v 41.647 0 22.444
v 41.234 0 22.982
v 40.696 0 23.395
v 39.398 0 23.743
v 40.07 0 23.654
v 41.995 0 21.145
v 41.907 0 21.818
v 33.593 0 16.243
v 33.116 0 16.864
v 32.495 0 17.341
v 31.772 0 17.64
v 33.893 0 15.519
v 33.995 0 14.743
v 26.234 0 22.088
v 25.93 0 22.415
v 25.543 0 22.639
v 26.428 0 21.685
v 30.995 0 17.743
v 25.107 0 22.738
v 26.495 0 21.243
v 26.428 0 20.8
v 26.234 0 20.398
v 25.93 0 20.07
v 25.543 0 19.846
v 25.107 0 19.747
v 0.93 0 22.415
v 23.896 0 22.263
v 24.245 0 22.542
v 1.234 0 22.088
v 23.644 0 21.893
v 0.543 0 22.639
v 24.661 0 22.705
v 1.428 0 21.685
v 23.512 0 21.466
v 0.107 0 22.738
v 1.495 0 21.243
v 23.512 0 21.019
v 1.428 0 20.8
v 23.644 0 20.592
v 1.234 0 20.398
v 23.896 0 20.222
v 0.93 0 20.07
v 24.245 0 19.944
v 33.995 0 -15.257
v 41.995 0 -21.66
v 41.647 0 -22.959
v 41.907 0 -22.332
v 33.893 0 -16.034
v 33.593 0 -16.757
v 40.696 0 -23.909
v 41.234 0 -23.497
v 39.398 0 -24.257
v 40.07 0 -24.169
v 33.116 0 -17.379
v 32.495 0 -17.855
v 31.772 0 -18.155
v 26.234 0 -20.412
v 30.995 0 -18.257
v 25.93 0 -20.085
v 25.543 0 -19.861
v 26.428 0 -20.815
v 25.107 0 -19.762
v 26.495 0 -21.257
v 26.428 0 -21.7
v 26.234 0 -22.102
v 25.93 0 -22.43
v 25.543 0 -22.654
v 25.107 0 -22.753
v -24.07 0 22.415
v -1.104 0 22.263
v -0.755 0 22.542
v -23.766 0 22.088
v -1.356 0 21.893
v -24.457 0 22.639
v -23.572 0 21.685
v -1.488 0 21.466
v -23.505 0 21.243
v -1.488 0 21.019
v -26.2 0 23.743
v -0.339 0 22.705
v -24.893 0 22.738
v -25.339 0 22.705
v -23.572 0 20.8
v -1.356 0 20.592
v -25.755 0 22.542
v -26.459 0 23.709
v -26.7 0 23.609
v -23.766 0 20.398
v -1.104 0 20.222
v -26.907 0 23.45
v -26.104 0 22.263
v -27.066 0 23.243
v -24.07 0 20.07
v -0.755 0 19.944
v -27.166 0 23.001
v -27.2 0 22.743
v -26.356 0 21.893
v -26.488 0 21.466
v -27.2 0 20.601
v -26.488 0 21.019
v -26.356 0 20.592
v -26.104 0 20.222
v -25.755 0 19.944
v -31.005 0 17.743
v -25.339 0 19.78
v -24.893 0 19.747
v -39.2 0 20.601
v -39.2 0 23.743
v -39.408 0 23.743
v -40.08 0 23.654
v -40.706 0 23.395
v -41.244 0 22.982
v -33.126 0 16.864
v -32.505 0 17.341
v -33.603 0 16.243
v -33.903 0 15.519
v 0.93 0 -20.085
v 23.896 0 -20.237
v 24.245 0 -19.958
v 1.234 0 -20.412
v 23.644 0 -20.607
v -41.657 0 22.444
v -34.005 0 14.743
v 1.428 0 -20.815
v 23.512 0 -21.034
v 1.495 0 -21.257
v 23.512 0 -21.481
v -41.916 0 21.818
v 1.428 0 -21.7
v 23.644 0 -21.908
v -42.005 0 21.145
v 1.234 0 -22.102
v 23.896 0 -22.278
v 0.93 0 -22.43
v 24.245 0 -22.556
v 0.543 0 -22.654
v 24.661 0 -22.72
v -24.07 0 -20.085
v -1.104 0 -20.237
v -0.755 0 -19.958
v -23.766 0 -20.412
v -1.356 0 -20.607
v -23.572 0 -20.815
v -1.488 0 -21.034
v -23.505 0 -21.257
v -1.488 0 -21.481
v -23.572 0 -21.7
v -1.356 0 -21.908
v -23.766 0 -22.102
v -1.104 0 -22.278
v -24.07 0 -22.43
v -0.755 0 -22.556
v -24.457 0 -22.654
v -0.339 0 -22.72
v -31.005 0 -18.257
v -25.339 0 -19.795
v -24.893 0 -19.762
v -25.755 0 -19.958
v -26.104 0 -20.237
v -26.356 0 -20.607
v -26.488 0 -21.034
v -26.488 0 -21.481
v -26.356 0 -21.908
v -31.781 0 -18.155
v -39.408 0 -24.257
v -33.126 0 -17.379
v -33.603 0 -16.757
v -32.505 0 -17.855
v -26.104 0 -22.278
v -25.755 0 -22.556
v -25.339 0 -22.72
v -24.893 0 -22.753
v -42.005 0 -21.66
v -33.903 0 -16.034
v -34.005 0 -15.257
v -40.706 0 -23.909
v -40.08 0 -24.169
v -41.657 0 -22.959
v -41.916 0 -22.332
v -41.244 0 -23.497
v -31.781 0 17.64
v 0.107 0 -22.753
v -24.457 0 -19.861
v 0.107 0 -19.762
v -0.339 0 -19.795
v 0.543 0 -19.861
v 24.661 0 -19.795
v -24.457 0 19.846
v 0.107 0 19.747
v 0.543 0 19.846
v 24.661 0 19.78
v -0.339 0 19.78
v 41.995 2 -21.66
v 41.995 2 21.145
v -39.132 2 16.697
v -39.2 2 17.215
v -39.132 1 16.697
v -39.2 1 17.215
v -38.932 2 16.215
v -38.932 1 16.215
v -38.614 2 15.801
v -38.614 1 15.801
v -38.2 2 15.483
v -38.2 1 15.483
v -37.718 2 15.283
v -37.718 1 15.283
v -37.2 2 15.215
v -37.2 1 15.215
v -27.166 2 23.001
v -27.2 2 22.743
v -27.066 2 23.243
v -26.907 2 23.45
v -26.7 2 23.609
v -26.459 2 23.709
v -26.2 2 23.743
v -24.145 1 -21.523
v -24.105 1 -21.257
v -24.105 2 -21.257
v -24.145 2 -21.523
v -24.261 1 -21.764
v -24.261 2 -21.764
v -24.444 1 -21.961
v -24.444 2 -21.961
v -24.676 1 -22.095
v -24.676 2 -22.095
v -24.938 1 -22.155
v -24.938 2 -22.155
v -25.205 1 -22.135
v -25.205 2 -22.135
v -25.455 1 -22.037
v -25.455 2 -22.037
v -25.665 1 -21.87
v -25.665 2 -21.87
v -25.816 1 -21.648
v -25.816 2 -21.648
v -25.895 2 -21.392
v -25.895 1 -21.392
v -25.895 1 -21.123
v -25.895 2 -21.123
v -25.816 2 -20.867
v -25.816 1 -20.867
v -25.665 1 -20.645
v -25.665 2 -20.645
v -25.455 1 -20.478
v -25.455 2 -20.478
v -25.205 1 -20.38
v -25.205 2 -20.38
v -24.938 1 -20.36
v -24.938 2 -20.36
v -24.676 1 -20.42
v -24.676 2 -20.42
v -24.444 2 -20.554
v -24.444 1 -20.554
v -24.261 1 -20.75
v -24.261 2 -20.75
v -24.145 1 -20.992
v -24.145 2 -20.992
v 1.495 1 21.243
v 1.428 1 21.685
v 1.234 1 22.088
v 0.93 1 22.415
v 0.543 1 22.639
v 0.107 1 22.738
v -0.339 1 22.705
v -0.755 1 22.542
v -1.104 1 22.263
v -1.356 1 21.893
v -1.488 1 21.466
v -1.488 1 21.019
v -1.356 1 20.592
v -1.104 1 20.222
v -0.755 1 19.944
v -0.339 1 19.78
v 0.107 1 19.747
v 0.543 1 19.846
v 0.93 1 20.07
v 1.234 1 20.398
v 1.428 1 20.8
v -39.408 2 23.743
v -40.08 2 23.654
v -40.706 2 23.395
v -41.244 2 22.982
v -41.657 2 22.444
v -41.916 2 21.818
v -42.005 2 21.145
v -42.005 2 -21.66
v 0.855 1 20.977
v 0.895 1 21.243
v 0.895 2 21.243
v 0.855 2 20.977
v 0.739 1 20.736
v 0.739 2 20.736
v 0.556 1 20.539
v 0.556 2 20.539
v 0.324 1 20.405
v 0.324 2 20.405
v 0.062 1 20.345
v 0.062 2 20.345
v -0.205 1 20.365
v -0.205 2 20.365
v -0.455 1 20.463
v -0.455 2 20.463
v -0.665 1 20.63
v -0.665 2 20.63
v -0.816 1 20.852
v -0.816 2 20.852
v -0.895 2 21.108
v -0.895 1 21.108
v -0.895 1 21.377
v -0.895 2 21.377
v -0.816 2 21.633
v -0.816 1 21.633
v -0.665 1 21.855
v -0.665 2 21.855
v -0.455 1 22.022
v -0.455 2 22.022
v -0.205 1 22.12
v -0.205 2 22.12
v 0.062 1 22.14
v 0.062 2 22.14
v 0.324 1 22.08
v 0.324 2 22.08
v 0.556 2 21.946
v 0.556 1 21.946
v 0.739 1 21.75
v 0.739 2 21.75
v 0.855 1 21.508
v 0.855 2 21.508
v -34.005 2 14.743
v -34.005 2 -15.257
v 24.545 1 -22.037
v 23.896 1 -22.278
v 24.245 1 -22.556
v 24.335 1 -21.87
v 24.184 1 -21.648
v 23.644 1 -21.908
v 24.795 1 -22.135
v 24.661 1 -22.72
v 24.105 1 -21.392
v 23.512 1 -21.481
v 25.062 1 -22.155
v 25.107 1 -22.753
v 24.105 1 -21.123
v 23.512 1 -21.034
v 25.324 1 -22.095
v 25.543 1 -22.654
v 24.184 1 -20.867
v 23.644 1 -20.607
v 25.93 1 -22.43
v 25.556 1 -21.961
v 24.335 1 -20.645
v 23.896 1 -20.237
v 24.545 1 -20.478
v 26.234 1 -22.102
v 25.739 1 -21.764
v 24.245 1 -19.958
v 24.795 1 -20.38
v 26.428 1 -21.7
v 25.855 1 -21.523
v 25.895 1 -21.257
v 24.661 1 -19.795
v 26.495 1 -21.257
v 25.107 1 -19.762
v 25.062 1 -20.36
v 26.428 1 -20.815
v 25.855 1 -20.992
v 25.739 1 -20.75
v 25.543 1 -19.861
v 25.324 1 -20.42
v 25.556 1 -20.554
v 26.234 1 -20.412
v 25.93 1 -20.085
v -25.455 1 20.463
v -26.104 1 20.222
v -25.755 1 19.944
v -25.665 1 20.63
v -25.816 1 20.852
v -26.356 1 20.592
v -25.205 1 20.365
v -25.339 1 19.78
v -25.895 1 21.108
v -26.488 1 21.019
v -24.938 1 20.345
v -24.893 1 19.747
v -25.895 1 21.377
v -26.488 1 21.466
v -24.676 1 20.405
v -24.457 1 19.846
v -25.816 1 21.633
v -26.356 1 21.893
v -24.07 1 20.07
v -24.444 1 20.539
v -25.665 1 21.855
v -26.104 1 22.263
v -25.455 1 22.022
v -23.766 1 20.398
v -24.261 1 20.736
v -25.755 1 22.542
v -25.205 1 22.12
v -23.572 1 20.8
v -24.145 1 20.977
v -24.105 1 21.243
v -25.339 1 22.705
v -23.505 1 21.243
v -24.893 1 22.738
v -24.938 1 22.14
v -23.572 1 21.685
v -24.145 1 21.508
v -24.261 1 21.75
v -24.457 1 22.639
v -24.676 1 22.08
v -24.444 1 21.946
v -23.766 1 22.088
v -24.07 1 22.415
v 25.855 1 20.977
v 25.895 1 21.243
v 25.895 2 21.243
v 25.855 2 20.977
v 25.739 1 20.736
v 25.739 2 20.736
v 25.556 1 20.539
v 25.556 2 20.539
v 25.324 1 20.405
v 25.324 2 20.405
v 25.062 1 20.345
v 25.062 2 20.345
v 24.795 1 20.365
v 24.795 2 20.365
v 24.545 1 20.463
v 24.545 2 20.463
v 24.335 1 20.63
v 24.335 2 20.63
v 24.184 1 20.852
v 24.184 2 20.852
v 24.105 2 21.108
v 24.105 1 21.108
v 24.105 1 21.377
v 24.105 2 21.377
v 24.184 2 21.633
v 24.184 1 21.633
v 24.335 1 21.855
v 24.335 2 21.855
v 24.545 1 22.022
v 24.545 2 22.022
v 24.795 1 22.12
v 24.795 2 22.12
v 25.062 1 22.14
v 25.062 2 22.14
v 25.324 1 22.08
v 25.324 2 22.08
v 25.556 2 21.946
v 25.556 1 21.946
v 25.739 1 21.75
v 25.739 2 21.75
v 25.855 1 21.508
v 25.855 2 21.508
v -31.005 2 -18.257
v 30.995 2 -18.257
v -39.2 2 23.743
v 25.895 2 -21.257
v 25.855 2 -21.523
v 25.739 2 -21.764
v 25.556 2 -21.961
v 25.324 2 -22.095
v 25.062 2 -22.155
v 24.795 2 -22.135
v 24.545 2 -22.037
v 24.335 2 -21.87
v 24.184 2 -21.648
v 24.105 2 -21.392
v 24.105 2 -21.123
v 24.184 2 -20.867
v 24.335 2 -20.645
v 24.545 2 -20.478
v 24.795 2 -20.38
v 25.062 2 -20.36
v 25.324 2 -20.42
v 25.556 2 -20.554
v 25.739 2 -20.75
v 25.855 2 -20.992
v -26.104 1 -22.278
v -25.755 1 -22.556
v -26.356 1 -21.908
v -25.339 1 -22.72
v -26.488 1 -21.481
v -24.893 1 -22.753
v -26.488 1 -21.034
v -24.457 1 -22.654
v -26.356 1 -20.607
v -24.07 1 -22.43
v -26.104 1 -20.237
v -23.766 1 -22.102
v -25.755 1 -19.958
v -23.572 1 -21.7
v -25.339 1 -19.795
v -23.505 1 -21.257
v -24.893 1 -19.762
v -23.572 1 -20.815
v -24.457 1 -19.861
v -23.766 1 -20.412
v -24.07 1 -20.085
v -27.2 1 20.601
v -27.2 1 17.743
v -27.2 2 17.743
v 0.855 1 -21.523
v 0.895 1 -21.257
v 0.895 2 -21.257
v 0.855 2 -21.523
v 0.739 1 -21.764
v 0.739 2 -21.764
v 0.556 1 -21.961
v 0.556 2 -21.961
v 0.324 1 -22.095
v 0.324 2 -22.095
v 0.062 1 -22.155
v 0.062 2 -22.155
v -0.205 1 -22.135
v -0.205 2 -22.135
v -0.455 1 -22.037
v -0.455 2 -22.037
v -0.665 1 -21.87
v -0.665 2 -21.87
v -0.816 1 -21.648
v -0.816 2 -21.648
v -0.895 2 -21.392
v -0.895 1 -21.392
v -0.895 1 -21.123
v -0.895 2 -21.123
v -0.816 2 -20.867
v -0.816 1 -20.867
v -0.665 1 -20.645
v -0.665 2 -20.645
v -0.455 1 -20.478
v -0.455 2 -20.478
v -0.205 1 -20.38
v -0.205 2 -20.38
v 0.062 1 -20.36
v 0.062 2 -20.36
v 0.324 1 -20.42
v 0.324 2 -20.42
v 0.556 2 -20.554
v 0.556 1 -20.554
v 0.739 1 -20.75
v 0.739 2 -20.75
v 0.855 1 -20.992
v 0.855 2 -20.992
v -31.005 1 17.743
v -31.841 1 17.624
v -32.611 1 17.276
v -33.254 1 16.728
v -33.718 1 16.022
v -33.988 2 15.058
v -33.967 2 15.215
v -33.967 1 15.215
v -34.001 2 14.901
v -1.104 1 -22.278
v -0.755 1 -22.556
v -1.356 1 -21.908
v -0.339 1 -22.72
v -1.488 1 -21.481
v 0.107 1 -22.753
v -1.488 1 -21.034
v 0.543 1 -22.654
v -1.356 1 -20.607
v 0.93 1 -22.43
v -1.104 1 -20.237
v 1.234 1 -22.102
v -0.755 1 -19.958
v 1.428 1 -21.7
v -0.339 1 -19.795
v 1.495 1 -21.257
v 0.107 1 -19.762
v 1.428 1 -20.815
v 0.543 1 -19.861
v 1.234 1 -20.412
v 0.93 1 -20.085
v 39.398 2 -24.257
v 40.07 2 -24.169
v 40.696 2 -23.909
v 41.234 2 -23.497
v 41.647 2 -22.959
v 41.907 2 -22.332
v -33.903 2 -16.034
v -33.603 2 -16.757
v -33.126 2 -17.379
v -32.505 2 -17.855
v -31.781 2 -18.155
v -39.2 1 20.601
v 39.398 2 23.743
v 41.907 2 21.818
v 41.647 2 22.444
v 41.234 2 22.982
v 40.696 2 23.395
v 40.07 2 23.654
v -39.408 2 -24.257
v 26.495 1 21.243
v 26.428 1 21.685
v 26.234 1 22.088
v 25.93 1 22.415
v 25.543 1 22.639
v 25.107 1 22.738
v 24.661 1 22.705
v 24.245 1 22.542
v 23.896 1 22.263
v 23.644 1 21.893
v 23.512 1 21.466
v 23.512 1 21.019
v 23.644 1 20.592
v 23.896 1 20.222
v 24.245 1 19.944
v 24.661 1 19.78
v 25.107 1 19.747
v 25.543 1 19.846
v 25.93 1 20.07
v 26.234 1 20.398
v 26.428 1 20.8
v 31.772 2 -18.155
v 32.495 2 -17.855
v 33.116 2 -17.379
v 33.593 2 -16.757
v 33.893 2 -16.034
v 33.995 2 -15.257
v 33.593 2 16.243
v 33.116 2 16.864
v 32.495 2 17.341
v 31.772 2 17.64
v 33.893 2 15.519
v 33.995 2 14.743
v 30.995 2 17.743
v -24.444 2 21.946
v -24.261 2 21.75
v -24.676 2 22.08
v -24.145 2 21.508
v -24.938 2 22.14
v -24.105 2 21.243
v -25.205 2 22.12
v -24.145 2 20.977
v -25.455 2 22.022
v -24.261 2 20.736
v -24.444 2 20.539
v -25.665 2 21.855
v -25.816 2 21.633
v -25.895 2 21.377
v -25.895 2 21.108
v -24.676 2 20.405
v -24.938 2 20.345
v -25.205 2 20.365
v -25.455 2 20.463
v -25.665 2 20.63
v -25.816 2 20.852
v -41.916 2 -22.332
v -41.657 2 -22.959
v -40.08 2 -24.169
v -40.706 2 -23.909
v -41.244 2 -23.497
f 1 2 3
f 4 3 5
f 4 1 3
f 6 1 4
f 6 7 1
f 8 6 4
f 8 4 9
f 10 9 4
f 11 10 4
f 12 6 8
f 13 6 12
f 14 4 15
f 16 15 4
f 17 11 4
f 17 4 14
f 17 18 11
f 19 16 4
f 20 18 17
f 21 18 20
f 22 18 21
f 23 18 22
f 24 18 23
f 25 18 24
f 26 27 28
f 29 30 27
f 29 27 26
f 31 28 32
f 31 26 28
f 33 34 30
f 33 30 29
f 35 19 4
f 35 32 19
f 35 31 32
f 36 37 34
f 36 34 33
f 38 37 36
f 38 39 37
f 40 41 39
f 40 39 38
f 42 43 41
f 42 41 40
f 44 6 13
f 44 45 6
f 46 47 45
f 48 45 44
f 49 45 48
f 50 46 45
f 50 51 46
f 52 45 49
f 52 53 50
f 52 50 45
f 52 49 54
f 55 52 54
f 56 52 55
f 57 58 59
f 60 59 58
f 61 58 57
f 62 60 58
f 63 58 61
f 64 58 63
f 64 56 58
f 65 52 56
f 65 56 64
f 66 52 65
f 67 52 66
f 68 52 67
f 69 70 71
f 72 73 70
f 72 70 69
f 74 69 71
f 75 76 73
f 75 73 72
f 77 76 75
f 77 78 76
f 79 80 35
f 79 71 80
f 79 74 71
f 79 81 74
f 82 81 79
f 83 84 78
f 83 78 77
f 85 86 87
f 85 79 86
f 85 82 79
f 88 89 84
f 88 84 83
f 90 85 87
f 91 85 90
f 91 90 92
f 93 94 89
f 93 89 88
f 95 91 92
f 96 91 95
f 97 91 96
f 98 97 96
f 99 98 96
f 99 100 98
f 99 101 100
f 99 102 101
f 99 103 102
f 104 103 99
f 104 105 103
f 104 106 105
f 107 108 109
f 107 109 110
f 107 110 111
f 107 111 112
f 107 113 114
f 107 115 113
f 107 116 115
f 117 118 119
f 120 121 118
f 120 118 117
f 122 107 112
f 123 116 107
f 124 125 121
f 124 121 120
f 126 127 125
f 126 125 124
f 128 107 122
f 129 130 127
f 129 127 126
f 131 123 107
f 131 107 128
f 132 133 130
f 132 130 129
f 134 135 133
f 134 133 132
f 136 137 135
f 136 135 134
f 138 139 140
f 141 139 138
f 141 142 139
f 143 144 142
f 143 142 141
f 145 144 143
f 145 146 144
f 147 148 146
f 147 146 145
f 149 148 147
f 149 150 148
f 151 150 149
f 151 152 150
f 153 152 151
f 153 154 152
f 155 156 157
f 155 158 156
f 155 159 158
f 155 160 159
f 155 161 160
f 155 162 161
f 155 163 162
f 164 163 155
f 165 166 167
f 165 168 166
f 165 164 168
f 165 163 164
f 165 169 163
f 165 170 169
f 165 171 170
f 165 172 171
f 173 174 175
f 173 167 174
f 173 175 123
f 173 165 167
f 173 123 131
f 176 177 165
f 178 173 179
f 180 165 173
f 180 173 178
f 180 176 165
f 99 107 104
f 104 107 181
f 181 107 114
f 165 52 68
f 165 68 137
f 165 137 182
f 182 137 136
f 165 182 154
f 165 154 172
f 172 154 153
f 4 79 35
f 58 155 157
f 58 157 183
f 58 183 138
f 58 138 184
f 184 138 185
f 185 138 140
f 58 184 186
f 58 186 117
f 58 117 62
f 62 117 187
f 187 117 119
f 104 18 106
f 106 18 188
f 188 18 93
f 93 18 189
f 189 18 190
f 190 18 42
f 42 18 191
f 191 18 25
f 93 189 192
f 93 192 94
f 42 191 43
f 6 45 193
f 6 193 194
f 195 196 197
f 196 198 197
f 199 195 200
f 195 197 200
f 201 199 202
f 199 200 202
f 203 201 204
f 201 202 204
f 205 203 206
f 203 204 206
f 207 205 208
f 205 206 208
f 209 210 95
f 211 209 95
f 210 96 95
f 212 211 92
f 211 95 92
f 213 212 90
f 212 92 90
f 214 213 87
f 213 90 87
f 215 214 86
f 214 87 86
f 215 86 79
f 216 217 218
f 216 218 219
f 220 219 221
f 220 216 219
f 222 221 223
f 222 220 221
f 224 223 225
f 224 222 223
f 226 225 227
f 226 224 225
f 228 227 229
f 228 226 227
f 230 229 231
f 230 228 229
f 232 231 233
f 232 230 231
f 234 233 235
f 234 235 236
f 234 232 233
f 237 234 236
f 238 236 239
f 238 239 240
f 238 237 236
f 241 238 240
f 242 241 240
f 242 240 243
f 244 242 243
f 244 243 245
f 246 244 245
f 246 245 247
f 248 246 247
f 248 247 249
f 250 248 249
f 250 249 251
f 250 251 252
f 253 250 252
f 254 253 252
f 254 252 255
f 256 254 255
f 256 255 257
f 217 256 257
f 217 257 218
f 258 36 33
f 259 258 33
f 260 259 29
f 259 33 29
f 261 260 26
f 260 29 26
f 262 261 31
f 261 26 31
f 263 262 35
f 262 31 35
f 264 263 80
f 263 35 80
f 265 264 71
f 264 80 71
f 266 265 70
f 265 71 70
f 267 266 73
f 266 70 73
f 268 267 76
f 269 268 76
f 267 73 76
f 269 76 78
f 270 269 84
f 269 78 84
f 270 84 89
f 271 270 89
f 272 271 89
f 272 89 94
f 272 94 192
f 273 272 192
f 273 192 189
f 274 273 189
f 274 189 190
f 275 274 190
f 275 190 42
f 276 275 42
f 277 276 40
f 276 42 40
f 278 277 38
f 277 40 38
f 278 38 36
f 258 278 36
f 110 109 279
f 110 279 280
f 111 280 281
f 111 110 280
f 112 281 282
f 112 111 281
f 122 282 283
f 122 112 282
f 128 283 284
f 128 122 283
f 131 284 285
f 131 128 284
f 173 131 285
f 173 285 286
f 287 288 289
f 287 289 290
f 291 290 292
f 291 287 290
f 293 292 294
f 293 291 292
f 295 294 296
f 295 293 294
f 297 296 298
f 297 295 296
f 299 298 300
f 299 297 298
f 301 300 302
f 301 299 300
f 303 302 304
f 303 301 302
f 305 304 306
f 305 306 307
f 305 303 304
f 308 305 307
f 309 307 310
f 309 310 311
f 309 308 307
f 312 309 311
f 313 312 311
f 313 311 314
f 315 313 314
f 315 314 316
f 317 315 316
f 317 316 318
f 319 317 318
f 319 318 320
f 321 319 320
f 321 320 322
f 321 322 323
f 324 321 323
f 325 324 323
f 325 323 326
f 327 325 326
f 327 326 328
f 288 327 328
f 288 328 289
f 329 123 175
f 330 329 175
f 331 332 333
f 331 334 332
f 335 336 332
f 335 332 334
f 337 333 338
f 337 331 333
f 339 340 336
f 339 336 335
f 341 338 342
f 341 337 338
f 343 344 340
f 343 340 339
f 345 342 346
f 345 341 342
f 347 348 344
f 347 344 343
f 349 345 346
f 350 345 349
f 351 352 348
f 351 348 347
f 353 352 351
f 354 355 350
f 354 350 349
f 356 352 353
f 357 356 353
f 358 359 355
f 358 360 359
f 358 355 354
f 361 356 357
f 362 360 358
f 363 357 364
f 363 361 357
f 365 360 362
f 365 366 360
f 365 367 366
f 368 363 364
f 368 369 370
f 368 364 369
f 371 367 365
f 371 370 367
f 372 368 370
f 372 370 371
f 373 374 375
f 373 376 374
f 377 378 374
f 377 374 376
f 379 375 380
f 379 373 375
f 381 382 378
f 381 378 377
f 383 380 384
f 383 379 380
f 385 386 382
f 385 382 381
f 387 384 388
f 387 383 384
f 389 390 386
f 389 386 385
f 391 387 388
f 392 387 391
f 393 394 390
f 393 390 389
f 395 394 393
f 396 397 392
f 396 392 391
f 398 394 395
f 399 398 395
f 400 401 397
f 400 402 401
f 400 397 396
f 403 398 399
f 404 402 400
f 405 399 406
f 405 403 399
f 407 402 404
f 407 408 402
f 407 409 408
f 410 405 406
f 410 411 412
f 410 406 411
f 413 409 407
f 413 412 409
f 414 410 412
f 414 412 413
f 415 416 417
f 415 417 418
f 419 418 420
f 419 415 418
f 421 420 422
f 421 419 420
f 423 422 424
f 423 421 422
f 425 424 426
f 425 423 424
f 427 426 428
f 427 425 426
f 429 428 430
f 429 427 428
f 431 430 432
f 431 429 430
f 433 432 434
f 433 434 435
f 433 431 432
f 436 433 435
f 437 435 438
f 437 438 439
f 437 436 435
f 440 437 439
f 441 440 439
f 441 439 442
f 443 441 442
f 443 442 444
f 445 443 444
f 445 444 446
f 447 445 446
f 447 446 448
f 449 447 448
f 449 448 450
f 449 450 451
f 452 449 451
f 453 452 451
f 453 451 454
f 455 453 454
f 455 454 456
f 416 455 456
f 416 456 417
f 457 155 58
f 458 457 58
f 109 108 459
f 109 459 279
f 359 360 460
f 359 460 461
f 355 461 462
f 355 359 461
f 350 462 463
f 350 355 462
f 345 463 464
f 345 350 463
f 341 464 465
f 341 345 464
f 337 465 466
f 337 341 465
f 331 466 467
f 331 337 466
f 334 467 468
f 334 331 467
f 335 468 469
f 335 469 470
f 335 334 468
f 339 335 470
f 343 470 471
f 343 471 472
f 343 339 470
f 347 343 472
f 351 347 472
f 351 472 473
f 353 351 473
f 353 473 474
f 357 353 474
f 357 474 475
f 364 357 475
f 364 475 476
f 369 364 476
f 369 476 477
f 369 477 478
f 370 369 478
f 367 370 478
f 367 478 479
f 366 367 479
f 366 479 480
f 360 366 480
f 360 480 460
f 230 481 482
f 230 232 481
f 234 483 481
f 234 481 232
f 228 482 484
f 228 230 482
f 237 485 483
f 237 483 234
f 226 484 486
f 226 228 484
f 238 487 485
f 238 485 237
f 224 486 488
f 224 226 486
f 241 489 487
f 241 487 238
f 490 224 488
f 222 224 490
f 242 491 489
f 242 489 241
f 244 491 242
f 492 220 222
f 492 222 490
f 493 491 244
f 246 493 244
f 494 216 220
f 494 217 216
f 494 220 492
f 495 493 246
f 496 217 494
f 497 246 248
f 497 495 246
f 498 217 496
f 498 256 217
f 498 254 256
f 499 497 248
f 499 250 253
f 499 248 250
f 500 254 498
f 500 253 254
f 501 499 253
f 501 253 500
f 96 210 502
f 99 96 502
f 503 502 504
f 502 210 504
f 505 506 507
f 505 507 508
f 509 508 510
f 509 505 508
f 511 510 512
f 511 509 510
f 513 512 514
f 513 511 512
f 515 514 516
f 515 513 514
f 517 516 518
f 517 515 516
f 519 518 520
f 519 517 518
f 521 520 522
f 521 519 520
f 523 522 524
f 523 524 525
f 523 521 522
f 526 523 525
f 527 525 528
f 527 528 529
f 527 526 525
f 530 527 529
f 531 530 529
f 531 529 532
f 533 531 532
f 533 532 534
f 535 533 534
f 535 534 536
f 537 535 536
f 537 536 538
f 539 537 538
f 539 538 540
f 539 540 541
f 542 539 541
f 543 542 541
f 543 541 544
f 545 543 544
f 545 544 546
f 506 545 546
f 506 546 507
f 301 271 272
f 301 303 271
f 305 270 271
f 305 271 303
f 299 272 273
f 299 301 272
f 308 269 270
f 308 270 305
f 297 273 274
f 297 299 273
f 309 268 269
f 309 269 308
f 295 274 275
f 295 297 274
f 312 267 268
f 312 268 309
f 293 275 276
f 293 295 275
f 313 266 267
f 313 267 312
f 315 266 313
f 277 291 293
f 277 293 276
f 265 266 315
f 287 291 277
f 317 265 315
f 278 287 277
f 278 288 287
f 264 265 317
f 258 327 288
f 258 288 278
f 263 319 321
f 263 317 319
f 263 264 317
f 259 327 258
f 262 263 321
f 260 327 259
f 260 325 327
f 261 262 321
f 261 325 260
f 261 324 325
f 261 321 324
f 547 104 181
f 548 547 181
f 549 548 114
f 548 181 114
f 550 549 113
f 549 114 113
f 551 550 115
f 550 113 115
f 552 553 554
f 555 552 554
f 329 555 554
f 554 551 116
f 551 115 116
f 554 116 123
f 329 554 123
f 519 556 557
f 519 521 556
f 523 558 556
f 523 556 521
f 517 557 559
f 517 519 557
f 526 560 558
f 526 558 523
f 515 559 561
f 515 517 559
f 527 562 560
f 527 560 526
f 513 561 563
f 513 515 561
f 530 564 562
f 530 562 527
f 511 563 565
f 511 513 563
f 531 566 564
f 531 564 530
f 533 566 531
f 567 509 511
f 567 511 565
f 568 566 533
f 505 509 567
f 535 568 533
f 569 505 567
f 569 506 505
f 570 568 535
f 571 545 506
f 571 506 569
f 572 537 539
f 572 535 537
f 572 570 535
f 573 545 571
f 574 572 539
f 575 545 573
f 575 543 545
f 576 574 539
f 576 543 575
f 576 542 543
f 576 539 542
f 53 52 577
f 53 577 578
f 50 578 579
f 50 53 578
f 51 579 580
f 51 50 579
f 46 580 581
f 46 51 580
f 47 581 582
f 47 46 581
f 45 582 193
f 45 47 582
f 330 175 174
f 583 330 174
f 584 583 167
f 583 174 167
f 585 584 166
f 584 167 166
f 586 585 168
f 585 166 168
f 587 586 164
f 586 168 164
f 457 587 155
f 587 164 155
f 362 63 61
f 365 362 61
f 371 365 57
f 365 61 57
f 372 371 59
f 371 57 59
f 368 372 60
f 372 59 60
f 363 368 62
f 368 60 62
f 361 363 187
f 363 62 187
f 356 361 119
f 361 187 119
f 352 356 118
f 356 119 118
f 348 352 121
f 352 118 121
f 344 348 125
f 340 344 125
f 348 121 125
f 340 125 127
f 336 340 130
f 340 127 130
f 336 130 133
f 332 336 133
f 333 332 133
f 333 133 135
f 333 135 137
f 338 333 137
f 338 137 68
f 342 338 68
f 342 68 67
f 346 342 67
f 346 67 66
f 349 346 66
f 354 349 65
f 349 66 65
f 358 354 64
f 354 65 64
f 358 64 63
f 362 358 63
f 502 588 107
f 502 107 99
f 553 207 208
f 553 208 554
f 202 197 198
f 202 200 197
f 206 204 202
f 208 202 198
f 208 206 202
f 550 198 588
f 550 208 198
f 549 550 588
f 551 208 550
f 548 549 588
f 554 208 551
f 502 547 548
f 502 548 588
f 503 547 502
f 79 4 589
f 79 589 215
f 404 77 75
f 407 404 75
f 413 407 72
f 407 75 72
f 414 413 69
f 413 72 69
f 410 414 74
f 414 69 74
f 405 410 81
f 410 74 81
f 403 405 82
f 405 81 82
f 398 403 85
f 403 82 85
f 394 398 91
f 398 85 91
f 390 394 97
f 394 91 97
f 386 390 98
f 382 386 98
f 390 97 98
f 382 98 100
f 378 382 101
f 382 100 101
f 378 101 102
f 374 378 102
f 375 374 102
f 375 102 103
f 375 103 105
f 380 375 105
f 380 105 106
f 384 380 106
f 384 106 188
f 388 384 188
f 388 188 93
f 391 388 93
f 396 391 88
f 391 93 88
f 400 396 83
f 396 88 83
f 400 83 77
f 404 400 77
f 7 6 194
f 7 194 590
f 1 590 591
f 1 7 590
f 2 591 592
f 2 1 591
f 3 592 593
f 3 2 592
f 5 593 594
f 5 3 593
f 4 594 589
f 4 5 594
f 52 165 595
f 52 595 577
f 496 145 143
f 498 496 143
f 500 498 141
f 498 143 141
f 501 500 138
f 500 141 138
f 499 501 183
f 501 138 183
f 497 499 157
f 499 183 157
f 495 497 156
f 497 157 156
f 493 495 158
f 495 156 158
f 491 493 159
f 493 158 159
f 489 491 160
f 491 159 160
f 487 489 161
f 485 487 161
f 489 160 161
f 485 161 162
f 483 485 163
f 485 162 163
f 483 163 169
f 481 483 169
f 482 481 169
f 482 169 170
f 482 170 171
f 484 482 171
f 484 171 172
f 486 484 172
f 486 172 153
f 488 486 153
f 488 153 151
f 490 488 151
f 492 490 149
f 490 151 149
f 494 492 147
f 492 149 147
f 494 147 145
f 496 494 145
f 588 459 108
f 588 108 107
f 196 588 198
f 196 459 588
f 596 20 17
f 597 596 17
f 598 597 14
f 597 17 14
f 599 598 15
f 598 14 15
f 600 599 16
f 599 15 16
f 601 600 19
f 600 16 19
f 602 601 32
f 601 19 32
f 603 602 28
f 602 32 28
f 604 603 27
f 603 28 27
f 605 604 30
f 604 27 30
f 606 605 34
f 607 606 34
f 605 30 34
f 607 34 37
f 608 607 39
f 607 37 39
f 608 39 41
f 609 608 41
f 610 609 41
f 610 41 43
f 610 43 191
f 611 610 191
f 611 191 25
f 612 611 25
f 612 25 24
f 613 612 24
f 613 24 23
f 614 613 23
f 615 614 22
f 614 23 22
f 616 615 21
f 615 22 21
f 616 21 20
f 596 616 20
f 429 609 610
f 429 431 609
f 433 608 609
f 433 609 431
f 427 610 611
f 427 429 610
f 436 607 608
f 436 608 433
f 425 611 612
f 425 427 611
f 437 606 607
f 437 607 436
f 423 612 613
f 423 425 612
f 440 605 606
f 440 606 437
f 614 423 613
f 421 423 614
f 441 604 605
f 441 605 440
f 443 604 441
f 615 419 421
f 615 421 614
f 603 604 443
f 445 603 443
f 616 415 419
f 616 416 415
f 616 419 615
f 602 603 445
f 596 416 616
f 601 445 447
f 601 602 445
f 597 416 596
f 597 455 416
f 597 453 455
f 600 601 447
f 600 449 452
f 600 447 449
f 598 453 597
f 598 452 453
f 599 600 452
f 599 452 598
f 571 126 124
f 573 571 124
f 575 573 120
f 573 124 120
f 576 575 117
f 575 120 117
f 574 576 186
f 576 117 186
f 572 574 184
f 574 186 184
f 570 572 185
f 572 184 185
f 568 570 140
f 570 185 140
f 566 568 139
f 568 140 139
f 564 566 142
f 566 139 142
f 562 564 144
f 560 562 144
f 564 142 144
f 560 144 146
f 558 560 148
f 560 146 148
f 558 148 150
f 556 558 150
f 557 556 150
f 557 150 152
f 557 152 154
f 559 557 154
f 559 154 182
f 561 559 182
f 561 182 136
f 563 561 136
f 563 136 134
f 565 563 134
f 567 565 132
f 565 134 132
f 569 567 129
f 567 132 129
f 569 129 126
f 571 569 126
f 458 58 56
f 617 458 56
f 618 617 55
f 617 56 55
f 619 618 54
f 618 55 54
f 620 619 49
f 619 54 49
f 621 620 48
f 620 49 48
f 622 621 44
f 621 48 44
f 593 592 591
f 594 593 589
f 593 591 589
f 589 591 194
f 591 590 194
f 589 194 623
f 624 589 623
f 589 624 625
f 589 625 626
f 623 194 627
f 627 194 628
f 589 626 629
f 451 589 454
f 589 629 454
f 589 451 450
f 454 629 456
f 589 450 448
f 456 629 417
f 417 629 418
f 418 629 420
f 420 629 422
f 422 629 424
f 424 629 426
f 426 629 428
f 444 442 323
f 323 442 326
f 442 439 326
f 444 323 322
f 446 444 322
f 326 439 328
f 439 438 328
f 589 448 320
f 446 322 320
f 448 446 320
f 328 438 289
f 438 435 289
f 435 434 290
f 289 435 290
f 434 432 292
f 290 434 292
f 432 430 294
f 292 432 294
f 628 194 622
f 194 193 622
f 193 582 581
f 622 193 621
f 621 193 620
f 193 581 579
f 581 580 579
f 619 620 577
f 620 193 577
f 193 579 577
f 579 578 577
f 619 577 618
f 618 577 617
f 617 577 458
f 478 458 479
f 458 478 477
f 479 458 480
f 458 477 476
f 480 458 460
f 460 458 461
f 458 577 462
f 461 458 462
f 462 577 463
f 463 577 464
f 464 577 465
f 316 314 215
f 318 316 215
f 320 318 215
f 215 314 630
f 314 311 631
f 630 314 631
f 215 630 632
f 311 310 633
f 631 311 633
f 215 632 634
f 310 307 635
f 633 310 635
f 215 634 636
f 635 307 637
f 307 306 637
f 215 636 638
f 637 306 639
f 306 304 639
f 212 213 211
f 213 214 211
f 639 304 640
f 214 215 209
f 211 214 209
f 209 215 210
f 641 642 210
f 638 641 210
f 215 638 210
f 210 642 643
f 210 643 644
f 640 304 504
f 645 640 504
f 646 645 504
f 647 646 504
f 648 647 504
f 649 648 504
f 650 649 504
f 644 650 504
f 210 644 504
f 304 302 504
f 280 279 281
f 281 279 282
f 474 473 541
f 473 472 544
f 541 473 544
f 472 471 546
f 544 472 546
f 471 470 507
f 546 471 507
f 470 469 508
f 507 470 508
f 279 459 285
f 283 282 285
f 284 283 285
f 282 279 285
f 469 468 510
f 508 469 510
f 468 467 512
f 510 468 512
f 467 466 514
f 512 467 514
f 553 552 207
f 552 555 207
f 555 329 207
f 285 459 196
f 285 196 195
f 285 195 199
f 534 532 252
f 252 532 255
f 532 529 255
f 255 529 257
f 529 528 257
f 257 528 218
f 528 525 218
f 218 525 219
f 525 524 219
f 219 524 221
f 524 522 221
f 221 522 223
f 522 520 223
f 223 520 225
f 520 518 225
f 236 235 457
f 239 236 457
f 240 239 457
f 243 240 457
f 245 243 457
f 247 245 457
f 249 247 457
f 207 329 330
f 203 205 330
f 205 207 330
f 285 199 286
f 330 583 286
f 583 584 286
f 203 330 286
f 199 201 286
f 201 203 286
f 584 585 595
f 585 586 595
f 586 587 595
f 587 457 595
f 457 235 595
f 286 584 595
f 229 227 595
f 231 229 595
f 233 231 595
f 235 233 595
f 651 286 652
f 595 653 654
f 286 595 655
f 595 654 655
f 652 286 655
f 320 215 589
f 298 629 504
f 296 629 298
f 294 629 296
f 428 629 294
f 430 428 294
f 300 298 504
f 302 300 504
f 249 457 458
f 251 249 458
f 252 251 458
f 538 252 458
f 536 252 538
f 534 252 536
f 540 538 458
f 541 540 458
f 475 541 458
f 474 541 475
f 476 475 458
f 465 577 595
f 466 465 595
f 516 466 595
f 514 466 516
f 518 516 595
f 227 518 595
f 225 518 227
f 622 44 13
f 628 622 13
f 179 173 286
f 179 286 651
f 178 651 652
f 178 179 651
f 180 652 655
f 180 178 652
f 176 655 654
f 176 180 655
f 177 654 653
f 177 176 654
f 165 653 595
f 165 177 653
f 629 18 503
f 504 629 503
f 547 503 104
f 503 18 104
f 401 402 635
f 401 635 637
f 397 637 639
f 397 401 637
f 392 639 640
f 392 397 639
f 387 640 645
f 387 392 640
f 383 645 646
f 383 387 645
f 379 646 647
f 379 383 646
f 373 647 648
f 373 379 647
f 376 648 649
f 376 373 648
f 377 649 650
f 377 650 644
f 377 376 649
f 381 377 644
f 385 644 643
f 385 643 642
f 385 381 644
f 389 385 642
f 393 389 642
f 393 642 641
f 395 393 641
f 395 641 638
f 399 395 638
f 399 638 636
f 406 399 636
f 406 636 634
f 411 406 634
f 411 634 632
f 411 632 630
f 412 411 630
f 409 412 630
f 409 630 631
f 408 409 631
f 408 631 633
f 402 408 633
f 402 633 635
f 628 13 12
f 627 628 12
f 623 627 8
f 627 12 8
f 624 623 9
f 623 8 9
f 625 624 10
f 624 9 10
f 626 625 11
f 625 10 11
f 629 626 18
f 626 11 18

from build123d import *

# Parameters (mm, degrees)
SKETCH_1_R          = 0.9
EXTRUDE_1_DEPTH     = 2
SKETCH_8_W          = 12
SKETCH_8_H          = 10.026739303
CUT_EXTRUDE_4_DEPTH = 1
SKETCH_9_R          = 1.5
CUT_EXTRUDE_7_DEPTH = 1
FILLET_1_R          = 2
SKETCH_10_W         = 12
SKETCH_10_H         = 6.28269209
CUT_EXTRUDE_8_DEPTH = 2
FILLET_2_R          = 1


with BuildPart() as part:
    # 草图1 → 凸台-拉伸1 (new body)
    with BuildSketch(Plane(origin=(0, 0, 0), x_dir=(1, 0, 0), z_dir=(0, 1, 0))):
        with BuildLine():
            Line((-39.407613887, 24.257383456), (39.397836405, 24.257383456))
            ThreePointArc((39.397836405, 24.257383456), (41.234387067, 23.496659264), (41.995111259, 21.660108602))
            Line((41.995111259, 21.660108602), (41.995111259, -21.14534169))
            ThreePointArc((41.995111259, -21.14534169), (41.234387067, -22.981892352), (39.397836405, -23.742616544))
            Line((39.397836405, -23.742616544), (-39.407613887, -23.742616544))
            ThreePointArc((-39.407613887, -23.742616544), (-41.244164549, -22.981892352), (-42.004888741, -21.14534169))
            Line((-42.004888741, -21.14534169), (-42.004888741, 21.660108602))
            ThreePointArc((-42.004888741, 21.660108602), (-41.244164549, 23.496659264), (-39.407613887, 24.257383456))
        make_face()
        with Locations((-25.004888281, 21.257382356)):
            Circle(SKETCH_1_R, mode=Mode.SUBTRACT)
        with Locations((-0.004887481, 21.257382356)):
            Circle(SKETCH_1_R, mode=Mode.SUBTRACT)
        with Locations((24.995110779, 21.257382356)):
            Circle(SKETCH_1_R, mode=Mode.SUBTRACT)
        with Locations((24.995110779, -21.242616464)):
            Circle(SKETCH_1_R, mode=Mode.SUBTRACT)
        with Locations((-0.004887481, -21.242616464)):
            Circle(SKETCH_1_R, mode=Mode.SUBTRACT)
        with Locations((-25.004888281, -21.242616464)):
            Circle(SKETCH_1_R, mode=Mode.SUBTRACT)
        with BuildLine():
            Line((-31.004888741, 18.257383456), (30.995111259, 18.257383456))
            ThreePointArc((30.995111259, 18.257383456), (33.116431602, 17.3787038), (33.995111259, 15.257383456))
            Line((33.995111259, 15.257383456), (33.995111259, -14.742616544))
            ThreePointArc((33.995111259, -14.742616544), (33.116431602, -16.863936887), (30.995111259, -17.742616544))
            Line((30.995111259, -17.742616544), (-31.004888741, -17.742616544))
            ThreePointArc((-31.004888741, -17.742616544), (-33.126209085, -16.863936887), (-34.004888741, -14.742616544))
            Line((-34.004888741, -14.742616544), (-34.004888741, 15.257383456))
            ThreePointArc((-34.004888741, 15.257383456), (-33.126209085, 17.3787038), (-31.004888741, 18.257383456))
        make_face(mode=Mode.SUBTRACT)
    extrude(amount=EXTRUDE_1_DEPTH)

    # 草图8 → 切除-拉伸4 (cut)
    with BuildSketch(Plane(origin=(0, 2, 0), x_dir=(1, 0, 0), z_dir=(0, 1, 0))):
        with Locations((-33.2, -20.228282189)):
            Rectangle(SKETCH_8_W, SKETCH_8_H)
    extrude(amount=-CUT_EXTRUDE_4_DEPTH, mode=Mode.SUBTRACT)

    # 草图9 → 切除-拉伸7 (cut)
    with BuildSketch(Plane.XZ):
        with Locations((-25.004888281, 21.242616464)):
            Circle(SKETCH_9_R)
        with Locations((-0.004887481, 21.242616464)):
            Circle(SKETCH_9_R)
        with Locations((24.995110779, 21.242616464)):
            Circle(SKETCH_9_R)
        with Locations((-25.004888281, -21.257382356)):
            Circle(SKETCH_9_R)
        with Locations((-0.004887481, -21.257382356)):
            Circle(SKETCH_9_R)
        with Locations((24.995110779, -21.257382356)):
            Circle(SKETCH_9_R)
    extrude(amount=-CUT_EXTRUDE_7_DEPTH, mode=Mode.SUBTRACT)

    # 圆角1
    fillet_1_edges = [part.edges().sort_by_distance(p)[0] for p in [
        (-39.2, 1.5, 15.214912538),
    ]]
    fillet(fillet_1_edges, radius=FILLET_1_R)

    # 草图10 → 切除-拉伸8 (cut, through all)
    with BuildSketch(Plane(origin=(0, 1, 0), x_dir=(1, 0, 0), z_dir=(0, 1, 0))):
        with Locations((-33.2, -23.742616544)):
            Rectangle(SKETCH_10_W, SKETCH_10_H)
    extrude(amount=-CUT_EXTRUDE_8_DEPTH, mode=Mode.SUBTRACT)

    # 圆角2
    fillet_2_edges = [part.edges().sort_by_distance(p)[0] for p in [
        (-27.2, 1, 23.742616544),
    ]]
    fillet(fillet_2_edges, radius=FILLET_2_R)


solid = part.part
